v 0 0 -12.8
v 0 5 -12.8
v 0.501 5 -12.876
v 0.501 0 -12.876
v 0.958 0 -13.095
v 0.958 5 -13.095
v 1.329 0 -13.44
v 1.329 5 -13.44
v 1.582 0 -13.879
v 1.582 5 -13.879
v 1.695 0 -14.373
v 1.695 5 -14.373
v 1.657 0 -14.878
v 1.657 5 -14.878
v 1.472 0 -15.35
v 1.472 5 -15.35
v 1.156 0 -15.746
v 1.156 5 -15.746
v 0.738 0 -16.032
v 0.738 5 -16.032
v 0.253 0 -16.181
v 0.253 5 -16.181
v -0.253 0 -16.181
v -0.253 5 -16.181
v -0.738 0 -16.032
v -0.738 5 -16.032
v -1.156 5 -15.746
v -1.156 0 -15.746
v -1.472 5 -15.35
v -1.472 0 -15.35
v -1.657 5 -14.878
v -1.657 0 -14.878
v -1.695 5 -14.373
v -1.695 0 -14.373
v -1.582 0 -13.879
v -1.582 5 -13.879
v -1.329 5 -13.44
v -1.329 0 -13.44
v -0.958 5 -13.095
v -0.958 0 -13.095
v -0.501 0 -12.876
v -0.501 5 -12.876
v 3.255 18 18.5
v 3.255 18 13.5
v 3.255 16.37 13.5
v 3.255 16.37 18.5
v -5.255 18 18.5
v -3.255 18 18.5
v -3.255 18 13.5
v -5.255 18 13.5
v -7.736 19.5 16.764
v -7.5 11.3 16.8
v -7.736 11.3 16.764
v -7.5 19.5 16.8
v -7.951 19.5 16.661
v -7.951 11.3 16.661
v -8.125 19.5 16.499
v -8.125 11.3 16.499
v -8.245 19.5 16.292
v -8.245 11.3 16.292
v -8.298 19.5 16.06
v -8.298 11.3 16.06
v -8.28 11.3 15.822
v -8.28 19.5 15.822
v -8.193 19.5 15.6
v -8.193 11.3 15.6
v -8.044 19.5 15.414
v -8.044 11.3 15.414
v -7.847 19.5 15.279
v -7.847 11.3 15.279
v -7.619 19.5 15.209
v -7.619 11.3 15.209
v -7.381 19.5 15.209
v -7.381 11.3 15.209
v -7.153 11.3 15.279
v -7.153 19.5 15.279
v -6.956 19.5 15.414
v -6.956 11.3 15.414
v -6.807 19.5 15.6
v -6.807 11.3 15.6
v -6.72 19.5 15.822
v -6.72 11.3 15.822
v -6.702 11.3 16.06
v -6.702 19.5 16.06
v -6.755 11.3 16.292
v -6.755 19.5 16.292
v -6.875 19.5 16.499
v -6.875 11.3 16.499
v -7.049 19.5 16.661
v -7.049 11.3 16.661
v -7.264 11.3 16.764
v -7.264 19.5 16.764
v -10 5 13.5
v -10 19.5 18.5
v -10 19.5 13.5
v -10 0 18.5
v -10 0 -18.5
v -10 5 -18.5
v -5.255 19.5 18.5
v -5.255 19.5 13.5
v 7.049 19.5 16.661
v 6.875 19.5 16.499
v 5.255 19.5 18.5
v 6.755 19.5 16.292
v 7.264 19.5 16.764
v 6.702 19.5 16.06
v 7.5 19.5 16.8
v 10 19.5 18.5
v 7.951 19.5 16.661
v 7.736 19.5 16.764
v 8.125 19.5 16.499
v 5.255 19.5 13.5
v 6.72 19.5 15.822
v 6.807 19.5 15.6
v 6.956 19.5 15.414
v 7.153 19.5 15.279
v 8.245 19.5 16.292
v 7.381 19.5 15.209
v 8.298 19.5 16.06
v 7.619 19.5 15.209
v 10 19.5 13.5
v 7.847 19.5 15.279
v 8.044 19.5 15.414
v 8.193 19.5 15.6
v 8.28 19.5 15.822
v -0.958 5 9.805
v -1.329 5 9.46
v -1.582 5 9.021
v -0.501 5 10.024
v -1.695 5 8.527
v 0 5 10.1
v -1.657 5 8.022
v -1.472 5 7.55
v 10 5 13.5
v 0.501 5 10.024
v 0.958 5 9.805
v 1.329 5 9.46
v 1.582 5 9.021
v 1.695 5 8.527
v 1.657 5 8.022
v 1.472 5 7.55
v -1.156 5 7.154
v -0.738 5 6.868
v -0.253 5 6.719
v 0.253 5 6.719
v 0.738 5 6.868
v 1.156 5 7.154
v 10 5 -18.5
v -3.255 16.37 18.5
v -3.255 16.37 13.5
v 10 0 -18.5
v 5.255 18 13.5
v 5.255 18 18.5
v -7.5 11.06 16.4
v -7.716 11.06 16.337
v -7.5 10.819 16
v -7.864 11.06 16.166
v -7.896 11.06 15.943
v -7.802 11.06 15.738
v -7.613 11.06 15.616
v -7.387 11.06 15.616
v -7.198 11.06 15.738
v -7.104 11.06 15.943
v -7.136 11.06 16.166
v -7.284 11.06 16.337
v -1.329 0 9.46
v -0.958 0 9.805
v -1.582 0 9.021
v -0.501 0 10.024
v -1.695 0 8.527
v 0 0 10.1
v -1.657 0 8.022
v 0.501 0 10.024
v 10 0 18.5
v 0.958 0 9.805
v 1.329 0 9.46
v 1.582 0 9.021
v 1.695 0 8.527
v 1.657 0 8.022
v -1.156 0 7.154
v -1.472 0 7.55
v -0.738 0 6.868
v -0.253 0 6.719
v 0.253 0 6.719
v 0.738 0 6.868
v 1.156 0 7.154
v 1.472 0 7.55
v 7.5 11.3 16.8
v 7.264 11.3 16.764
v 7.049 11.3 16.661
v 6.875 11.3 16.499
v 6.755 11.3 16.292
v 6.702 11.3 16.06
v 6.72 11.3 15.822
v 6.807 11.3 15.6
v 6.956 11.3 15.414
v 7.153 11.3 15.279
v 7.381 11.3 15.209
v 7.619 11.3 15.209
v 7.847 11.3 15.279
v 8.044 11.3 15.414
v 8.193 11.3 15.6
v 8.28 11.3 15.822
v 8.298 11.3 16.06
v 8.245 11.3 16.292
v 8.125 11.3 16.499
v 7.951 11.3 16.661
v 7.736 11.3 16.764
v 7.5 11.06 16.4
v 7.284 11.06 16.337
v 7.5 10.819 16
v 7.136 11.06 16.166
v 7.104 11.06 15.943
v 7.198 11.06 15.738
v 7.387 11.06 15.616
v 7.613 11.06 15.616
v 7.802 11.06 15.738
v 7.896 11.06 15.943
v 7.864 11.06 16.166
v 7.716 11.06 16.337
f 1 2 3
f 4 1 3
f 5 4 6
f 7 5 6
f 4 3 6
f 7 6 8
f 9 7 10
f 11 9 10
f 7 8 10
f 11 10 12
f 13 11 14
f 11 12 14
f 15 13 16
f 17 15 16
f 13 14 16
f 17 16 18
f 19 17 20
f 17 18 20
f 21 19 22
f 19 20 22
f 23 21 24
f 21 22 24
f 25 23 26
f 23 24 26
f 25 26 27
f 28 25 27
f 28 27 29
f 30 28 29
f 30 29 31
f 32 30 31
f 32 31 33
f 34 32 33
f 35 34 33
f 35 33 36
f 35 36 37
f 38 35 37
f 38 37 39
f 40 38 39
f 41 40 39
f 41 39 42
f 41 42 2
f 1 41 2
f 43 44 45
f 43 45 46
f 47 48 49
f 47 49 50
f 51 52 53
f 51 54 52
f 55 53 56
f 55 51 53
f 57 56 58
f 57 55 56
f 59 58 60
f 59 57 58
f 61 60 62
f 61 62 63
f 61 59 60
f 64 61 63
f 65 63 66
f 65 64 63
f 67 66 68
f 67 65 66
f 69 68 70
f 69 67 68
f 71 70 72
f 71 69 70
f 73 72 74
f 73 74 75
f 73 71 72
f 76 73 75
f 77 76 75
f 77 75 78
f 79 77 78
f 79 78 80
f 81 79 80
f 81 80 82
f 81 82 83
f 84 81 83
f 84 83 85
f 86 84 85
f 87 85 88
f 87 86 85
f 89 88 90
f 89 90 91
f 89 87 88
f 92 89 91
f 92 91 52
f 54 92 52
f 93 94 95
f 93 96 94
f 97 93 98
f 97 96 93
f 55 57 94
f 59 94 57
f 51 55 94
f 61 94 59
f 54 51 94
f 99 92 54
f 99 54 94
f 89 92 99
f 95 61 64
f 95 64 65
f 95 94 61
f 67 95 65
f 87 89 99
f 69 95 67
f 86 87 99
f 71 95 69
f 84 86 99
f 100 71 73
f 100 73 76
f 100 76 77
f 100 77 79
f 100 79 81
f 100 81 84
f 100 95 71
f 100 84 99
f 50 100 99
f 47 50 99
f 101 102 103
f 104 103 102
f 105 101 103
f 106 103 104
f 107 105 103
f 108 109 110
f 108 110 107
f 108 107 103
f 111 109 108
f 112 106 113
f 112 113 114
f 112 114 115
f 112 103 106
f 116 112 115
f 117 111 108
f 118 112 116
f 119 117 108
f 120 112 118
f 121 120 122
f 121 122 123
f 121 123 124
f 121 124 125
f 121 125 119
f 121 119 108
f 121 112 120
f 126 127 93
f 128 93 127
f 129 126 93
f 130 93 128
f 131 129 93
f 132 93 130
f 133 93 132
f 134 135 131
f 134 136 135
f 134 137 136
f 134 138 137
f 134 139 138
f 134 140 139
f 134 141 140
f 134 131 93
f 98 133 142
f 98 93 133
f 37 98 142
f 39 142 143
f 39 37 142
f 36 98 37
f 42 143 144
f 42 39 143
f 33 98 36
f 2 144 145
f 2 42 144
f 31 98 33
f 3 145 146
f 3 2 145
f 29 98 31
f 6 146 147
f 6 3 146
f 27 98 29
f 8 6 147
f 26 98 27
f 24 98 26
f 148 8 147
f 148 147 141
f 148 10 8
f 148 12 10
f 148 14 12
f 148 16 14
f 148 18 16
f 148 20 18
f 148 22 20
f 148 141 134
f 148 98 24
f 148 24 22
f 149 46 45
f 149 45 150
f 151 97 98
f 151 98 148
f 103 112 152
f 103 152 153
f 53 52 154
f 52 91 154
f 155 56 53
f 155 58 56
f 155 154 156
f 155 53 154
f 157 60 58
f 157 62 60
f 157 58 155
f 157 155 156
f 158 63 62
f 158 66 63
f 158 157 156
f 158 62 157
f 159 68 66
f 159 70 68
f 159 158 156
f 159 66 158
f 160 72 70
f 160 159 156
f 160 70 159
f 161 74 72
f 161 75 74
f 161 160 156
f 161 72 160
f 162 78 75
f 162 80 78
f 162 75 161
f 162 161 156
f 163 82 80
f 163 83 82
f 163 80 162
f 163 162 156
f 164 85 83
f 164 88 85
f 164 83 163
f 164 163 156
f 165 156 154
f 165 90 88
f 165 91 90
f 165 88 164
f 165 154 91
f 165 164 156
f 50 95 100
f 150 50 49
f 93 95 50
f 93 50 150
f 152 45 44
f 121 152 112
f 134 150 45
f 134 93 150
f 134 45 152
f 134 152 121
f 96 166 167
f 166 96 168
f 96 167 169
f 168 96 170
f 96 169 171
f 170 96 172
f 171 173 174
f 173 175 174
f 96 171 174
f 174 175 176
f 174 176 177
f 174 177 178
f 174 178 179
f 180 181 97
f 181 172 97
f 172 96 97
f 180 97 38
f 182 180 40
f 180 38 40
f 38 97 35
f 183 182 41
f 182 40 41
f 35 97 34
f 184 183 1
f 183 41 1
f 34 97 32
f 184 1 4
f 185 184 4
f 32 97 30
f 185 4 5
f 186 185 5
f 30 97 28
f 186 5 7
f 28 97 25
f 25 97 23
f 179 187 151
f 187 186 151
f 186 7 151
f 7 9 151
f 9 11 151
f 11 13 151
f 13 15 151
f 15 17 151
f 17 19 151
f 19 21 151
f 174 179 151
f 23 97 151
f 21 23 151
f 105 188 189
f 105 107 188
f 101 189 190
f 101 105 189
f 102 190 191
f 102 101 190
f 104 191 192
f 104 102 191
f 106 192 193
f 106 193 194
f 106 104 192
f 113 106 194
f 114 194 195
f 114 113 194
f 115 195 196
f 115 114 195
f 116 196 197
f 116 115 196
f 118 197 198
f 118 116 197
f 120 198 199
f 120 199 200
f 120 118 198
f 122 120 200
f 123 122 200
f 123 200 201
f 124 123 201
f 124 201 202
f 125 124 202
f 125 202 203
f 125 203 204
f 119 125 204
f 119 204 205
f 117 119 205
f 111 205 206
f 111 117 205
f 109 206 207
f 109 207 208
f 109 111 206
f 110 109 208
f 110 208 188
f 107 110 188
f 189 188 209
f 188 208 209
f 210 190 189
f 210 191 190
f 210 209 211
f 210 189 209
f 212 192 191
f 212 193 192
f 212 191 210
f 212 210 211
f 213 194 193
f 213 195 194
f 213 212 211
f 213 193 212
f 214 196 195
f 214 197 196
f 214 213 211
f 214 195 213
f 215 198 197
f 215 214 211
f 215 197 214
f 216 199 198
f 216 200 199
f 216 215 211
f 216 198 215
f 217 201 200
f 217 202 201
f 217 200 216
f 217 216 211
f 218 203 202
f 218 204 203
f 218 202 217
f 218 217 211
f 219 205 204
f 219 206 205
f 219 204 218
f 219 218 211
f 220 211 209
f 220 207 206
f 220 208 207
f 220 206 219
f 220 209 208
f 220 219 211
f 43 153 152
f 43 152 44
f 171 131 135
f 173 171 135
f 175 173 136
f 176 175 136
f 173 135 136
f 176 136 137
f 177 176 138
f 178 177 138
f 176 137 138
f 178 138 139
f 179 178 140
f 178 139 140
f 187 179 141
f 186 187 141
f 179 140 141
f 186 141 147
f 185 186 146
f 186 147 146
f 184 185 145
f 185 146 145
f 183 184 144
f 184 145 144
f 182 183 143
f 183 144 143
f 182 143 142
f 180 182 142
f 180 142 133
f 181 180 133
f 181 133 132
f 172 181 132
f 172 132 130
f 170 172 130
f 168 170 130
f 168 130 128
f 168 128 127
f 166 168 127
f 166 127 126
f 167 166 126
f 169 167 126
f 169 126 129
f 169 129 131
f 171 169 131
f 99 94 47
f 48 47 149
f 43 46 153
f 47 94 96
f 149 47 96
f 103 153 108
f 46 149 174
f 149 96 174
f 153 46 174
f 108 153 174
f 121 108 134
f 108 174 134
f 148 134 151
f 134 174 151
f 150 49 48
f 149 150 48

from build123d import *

# Parameters (mm, degrees)
SKETCH2_W                  = 20
SKETCH2_H                  = 37
EXTRUDE1_DEPTH             = 5
F_3_4_3_4_DIAMETER_HOLE1_D = 3.4
LPATTERN1_COUNT            = 2
LPATTERN1_PITCH            = 22.9
SKETCH5_W                  = 20
SKETCH5_H                  = 5
EXTRUDE2_DEPTH             = 14.5
LPATTERN2_COUNT            = 2
LPATTERN2_PITCH            = 15
SKETCH6_W                  = 10.51
SKETCH6_H                  = 5
EXTRUDE3_DEPTH             = 1.5
SKETCH7_W                  = 6.51
SKETCH7_H                  = 5
EXTRUDE4_DEPTH             = 1.63


with BuildPart() as part:
    # Sketch2 → Extrude1 (new body)
    with BuildSketch(Plane(origin=(0, 0, 0), x_dir=(1, 0, 0), z_dir=(0, 1, 0))):
        Rectangle(SKETCH2_W, SKETCH2_H)
    extrude(amount=EXTRUDE1_DEPTH)

    # Ø3.4 (3.4) Diameter Hole1 (through all)
    with Locations(Plane(origin=(0, 0, -14.5), x_dir=(0, 0, -1), z_dir=(0, -1, 0))):
        with Locations((0, 0)):
            f_3_4_3_4_diameter_hole1 = Hole(F_3_4_3_4_DIAMETER_HOLE1_D / 2)

    # LPattern1: Ø3.4 (3.4) Diameter Hole1 ×2
    with Locations(*[(0, 0, i * LPATTERN1_PITCH) for i in range(1, LPATTERN1_COUNT)]):
        add(f_3_4_3_4_diameter_hole1, mode=Mode.SUBTRACT)

    # Sketch5 → Extrude2 (add)
    with BuildSketch(Plane(origin=(0, 5, 0), x_dir=(1, 0, 0), z_dir=(0, 1, 0))):
        with Locations((0, -16)):
            Rectangle(SKETCH5_W, SKETCH5_H)
    extrude(amount=EXTRUDE2_DEPTH)

    # Sketch10 → M2x0.4 Tapped Hole1 (revolve, cut)
    with BuildSketch(Plane(origin=(-7.5, 19.5, 16), x_dir=(0, 0, 1), z_dir=(1, 0, 0))):
        Polygon((0, 0), (0, 8.680688495), (0.8, 8.2), (0.8, 0), align=None)
    m2x0_4_tapped_hole1 = revolve(axis=Axis((-7.5, 25.85, 16), (0, -1, 0)), mode=Mode.SUBTRACT)

    # LPattern2: M2x0.4 Tapped Hole1 ×2
    with Locations(*[(i * LPATTERN2_PITCH, 0, 0) for i in range(1, LPATTERN2_COUNT)]):
        add(m2x0_4_tapped_hole1, mode=Mode.SUBTRACT)

    # Sketch6 → Extrude3 (cut)
    with BuildSketch(Plane(origin=(0, 19.5, 0), x_dir=(-1, 0, 0), z_dir=(0, 1, 0))):
        with Locations((0, 16)):
            Rectangle(SKETCH6_W, SKETCH6_H)
    extrude(amount=-EXTRUDE3_DEPTH, mode=Mode.SUBTRACT)

    # Sketch7 → Extrude4 (cut)
    with BuildSketch(Plane(origin=(0, 18, 0), x_dir=(-1, 0, 0), z_dir=(0, 1, 0))):
        with Locations((0, 16)):
            Rectangle(SKETCH7_W, SKETCH7_H)
    extrude(amount=-EXTRUDE4_DEPTH, mode=Mode.SUBTRACT)


solid = part.part
